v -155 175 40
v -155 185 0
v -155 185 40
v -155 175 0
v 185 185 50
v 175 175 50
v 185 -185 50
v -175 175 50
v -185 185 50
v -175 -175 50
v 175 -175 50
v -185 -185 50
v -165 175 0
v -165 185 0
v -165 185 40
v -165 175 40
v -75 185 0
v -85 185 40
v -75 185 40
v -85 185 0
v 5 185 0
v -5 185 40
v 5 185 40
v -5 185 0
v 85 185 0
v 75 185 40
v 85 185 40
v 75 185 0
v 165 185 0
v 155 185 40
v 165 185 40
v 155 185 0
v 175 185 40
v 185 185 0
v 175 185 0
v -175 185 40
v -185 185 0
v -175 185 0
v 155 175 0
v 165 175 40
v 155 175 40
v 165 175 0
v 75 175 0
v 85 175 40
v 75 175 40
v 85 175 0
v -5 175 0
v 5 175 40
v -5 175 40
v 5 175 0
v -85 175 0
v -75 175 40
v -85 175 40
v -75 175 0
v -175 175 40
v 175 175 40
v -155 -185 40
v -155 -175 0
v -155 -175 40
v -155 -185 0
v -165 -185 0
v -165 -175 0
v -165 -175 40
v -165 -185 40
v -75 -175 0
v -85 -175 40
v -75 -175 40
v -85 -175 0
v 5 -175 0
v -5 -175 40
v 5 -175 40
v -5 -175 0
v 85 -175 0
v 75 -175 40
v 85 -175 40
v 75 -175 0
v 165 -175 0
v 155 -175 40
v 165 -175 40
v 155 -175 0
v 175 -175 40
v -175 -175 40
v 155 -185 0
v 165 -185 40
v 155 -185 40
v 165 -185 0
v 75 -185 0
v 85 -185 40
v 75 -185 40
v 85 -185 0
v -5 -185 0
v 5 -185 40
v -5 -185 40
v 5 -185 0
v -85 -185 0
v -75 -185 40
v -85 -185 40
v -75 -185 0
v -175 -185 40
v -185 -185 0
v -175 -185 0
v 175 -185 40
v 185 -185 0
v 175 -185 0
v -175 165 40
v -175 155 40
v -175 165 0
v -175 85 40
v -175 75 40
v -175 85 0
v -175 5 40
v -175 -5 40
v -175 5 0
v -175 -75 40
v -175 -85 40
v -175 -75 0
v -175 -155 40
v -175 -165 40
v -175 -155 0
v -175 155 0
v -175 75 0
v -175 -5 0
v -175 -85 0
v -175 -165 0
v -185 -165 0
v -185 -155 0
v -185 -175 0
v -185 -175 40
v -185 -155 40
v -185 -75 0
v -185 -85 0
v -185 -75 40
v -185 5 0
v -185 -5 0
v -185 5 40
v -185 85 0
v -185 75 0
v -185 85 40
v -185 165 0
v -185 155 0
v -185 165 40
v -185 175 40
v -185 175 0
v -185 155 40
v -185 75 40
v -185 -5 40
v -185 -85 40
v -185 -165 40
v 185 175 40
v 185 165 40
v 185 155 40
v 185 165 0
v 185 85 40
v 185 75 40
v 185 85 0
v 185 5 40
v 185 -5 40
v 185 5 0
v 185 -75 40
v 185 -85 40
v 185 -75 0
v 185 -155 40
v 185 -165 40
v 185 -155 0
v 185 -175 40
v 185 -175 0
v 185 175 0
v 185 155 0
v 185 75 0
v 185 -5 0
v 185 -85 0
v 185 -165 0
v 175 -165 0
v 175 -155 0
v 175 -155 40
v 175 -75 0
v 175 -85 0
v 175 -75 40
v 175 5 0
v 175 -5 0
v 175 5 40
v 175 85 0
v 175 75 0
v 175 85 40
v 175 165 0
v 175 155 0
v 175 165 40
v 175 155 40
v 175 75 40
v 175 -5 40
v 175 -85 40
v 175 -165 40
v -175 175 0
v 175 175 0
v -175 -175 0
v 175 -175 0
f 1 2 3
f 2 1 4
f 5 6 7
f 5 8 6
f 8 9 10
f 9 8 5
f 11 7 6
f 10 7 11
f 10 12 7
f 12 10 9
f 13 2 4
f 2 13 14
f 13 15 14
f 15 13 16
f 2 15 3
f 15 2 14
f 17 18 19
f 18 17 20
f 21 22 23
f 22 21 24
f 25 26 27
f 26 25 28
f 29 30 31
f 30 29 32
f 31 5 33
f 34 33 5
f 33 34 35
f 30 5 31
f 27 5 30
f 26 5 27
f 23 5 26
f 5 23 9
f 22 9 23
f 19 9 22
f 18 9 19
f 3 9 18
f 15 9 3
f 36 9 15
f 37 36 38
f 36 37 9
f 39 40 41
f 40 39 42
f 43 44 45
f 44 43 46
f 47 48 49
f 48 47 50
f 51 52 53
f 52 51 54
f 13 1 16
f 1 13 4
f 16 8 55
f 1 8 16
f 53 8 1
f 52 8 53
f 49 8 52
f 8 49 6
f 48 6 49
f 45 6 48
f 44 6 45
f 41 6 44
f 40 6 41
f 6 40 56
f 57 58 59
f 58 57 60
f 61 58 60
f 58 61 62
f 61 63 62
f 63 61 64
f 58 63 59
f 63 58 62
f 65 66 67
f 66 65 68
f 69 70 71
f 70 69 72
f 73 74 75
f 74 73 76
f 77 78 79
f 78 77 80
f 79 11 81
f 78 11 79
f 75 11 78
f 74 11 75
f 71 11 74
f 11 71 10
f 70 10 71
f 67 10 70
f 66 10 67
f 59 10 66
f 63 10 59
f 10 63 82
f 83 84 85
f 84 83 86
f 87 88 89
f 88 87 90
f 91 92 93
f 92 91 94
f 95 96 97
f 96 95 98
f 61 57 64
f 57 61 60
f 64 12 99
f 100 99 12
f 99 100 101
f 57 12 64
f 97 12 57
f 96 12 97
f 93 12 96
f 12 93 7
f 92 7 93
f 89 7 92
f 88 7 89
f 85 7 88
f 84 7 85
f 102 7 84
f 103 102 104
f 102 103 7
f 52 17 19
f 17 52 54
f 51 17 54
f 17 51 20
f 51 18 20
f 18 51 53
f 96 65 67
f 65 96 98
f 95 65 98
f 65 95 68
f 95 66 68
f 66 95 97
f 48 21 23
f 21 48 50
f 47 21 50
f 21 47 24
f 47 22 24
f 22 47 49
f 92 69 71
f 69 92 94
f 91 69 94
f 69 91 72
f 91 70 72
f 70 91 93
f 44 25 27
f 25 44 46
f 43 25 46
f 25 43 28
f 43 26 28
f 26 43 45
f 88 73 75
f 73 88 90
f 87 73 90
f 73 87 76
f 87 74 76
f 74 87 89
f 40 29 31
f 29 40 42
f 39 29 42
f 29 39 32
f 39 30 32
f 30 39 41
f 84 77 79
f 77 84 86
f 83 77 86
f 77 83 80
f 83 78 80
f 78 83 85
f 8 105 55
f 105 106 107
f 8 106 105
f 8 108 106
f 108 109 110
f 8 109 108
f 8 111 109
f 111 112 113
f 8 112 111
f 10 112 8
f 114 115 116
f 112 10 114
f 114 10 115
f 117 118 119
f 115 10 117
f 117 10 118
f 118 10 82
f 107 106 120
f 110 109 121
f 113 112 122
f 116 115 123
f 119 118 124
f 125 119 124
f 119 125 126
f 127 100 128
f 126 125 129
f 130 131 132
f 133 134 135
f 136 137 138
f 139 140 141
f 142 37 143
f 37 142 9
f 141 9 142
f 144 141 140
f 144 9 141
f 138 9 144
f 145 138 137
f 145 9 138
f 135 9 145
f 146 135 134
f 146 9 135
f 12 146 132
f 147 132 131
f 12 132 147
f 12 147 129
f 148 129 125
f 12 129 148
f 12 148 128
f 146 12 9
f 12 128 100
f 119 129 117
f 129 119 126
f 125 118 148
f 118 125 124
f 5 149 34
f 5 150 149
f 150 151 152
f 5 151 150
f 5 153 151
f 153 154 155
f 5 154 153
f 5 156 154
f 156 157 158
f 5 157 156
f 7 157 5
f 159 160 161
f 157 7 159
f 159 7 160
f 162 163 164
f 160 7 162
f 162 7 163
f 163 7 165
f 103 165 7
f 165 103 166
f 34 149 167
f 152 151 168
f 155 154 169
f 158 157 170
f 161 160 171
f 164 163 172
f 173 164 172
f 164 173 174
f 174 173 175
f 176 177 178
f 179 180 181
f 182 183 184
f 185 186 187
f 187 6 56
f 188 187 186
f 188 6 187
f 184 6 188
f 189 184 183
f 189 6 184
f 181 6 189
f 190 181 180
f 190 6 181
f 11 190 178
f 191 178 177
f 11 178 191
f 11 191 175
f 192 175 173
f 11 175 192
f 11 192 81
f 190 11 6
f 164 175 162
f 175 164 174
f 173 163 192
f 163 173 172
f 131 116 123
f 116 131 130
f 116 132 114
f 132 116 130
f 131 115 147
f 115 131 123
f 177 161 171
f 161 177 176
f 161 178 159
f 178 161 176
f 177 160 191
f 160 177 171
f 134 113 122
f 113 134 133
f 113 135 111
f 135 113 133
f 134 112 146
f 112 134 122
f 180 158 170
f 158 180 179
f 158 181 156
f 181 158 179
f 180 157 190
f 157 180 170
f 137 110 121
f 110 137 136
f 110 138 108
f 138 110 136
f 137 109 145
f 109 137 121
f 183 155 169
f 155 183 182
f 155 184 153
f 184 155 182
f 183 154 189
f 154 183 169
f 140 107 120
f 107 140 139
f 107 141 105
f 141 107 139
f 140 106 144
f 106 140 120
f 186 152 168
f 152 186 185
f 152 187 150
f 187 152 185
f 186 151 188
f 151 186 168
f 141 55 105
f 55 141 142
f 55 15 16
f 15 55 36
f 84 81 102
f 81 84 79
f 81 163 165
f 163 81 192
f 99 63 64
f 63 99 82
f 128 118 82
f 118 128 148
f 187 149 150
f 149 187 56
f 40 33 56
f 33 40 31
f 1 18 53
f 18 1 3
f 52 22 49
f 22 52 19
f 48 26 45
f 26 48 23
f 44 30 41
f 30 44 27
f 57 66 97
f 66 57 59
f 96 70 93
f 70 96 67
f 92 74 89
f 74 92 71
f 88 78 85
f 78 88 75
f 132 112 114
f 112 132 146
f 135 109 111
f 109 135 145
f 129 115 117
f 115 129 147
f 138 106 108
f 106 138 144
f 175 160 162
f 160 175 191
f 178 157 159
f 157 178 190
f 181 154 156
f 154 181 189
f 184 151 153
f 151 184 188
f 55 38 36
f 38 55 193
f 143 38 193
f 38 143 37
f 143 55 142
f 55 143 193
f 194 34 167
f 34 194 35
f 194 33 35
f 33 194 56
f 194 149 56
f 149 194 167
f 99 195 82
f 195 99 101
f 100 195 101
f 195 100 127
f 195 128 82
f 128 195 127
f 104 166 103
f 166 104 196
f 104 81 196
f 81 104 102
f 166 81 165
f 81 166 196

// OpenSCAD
// Cage slice 4
// Internal cavity: 350 x 350 x 700 mm
// Bar thickness: 10 mm (square)
// Gap between bars: 70 mm (uniform)
// Slice index: 4, slice Z range: [200, 250] (local coordinates 0..50)
// This file places the slice with its bottom on Z=0; when assembling, translate in Z by 200 mm.
// Export to STL with OpenSCAD: Render -> Export as STL.

bar = 10;
gap = 70;
s = bar + gap;
$fn = 64;  // cylinder resolution

x_centers = [-160, -80, 0, 80, 160];
y_centers = [-160, -80, 0, 80, 160];
z_centers = [5, 85, 165, 245, 325, 405, 485, 565, 645];

slice_index = 4;
slice_h = 50;

front_y = 180;
back_y = -180;
left_x = -180;
right_x = 180;
panel_length = 370;

hole_diam = 6.6;

module slice() {
    union() {
        // vertical bars on front and back (along Z)
        for (x = x_centers) {
            translate([x, front_y, slice_h/2]) cube([bar, bar, slice_h], center=true);
            translate([x, back_y, slice_h/2])  cube([bar, bar, slice_h], center=true);
        }
        // vertical bars on left and right (along Z)
        for (y = y_centers) {
            translate([left_x, y, slice_h/2])  cube([bar, bar, slice_h], center=true);
            translate([right_x, y, slice_h/2]) cube([bar, bar, slice_h], center=true);
        }
        // explicit corner vertical bars (ensure 4 corners for M6 rods)
        translate([-180, 180, slice_h/2]) cube([bar, bar, slice_h], center=true);
        translate([180, 180, slice_h/2]) cube([bar, bar, slice_h], center=true);
        translate([-180, -180, slice_h/2]) cube([bar, bar, slice_h], center=true);
        translate([180, -180, slice_h/2]) cube([bar, bar, slice_h], center=true);

        // horizontal bars (10 mm thick in Z) that lie inside this slice
        for (zc = z_centers) {
            z_local = zc - slice_index*slice_h;
            // include this horizontal bar if its center lies within this slice and it fits entirely here
            if (z_local >= bar/2 && z_local <= slice_h - bar/2) {
                // front and back horizontal bars (run along X)
                translate([0, front_y, z_local]) cube([panel_length, bar, bar], center=true);
                translate([0, back_y,  z_local]) cube([panel_length, bar, bar], center=true);
                // left and right horizontal bars (run along Y)
                translate([left_x, 0, z_local]) cube([bar, panel_length, bar], center=true);
                translate([right_x,0, z_local]) cube([bar, panel_length, bar], center=true);
            }
        }
    }
}

difference() {
    slice();
    // four vertical holes for M6 rods through corner bars (slightly longer than slice to ensure clean subtraction)
    translate([-180, 180, slice_h/2]) rotate([0,0,0]) cylinder(h = slice_h*4, r = hole_diam/2, center=true);
    translate([180, 180, slice_h/2]) rotate([0,0,0]) cylinder(h = slice_h*4, r = hole_diam/2, center=true);
    translate([-180, -180, slice_h/2]) rotate([0,0,0]) cylinder(h = slice_h*4, r = hole_diam/2, center=true);
    translate([180, -180, slice_h/2]) rotate([0,0,0]) cylinder(h = slice_h*4, r = hole_diam/2, center=true);
}

slice();
